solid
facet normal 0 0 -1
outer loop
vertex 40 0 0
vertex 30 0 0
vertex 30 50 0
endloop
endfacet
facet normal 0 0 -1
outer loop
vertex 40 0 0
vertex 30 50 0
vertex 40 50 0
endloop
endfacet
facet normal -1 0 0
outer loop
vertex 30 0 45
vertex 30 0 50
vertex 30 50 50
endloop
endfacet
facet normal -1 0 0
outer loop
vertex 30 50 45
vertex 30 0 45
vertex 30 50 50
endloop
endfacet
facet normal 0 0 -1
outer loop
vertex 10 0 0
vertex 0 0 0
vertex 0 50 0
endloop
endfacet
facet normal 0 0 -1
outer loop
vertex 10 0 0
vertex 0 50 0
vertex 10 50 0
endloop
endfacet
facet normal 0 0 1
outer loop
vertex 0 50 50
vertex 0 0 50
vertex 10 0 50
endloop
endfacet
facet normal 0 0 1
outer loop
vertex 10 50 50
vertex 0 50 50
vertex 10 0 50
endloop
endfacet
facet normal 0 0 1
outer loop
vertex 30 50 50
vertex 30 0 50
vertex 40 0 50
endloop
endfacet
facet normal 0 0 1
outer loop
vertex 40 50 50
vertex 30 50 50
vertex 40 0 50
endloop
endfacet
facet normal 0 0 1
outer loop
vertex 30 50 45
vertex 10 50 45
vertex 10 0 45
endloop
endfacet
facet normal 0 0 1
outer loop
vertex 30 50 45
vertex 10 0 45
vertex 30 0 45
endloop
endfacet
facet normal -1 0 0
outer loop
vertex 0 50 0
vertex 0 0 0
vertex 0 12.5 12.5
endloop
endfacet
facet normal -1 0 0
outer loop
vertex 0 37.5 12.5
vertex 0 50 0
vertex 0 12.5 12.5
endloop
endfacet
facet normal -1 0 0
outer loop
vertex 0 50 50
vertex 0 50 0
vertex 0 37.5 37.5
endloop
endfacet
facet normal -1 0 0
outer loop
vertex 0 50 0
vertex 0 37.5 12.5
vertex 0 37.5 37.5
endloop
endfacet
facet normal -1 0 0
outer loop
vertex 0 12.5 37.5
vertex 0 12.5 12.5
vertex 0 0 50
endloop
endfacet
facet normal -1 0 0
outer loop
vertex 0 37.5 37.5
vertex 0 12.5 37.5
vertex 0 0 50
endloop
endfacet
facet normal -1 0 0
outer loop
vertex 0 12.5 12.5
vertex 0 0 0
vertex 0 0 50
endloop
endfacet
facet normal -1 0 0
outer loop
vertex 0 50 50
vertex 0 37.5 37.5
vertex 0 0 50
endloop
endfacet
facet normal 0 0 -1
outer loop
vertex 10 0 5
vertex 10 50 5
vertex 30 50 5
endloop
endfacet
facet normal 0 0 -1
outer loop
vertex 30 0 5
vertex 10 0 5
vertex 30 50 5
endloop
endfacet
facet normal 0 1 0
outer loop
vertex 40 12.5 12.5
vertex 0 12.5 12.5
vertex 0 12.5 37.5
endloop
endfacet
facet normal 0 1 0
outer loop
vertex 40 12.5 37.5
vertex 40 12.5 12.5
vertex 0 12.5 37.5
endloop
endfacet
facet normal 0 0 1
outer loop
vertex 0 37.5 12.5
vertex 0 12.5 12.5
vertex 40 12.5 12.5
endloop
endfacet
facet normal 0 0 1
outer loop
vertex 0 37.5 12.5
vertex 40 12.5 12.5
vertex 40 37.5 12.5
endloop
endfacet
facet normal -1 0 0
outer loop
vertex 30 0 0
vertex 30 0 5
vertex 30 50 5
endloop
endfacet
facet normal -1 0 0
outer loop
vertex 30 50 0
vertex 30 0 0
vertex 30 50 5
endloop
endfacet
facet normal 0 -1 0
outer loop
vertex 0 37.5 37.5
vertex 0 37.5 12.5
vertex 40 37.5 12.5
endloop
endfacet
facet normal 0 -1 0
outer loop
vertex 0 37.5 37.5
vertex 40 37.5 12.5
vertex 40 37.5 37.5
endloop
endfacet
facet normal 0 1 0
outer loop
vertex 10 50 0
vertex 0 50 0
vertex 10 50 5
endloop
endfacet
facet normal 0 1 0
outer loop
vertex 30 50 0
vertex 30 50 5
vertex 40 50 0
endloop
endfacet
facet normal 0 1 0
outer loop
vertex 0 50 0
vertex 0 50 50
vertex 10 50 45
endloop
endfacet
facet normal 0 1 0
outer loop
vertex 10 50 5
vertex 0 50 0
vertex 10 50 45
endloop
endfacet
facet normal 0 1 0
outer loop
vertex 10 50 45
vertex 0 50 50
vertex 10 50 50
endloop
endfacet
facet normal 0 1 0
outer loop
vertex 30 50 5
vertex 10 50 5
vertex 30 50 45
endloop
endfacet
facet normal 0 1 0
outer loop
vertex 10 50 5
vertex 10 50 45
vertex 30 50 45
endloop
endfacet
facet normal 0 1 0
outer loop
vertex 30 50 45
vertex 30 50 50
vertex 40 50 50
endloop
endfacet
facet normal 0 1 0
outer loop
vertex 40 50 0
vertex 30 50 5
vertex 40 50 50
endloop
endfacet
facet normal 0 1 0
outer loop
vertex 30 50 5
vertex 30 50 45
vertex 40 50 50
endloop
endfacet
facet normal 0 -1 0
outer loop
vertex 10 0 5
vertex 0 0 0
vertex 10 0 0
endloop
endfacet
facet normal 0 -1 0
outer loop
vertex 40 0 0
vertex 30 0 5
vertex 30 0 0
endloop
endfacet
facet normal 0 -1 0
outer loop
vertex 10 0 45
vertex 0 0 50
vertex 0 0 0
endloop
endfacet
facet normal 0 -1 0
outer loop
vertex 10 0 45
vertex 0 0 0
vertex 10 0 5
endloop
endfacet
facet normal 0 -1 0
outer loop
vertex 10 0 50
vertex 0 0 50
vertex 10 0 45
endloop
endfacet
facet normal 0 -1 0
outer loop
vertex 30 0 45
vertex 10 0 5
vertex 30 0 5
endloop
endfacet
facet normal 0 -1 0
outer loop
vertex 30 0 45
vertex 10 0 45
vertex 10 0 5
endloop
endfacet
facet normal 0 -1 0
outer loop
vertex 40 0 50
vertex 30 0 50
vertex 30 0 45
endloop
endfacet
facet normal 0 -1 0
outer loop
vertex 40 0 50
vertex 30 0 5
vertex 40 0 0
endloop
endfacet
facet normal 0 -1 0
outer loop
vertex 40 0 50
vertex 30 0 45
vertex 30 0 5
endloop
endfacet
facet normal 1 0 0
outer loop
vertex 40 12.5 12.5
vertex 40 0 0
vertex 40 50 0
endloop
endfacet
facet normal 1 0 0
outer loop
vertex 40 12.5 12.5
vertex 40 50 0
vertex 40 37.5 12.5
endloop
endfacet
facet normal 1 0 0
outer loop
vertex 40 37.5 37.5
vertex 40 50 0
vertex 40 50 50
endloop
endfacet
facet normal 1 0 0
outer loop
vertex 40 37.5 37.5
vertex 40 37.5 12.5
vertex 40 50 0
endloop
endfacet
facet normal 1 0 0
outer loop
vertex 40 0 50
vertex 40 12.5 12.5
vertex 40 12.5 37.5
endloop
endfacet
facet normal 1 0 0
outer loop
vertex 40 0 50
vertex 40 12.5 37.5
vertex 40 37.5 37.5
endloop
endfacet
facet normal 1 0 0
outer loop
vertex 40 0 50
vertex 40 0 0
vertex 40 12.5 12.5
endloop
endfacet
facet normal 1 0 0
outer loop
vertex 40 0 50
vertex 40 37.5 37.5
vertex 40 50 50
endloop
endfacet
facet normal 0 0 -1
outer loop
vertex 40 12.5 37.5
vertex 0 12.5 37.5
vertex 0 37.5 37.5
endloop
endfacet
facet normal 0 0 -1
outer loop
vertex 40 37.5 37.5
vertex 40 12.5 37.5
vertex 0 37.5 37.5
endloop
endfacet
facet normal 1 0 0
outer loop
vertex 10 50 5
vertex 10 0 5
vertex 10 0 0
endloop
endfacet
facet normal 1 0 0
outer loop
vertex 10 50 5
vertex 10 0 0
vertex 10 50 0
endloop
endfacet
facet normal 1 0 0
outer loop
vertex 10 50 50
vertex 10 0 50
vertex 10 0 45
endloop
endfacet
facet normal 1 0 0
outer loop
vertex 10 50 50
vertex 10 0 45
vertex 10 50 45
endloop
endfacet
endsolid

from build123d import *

# Parameters (mm, degrees)
F0_W          = 40
F0_H          = 50
F1_DEPTH      = 50
F2_W          = 25
F2_H          = 25
F3_DEPTH      = 139.9
F3_DEPTH_BACK = 82.6
F5_W          = 20
F5_H          = 50
F6_DEPTH      = 5
F7_START      = -45
F7_DEPTH      = 30.1


with BuildPart() as f1:
    # F0 (on Front) → F1 (new body)
    with BuildSketch(Plane.XZ):
        with Locations((20, 25)):
            Rectangle(F0_W, F0_H)
    extrude(amount=-F1_DEPTH)


with BuildPart() as f3:
    # F2 (on face) → F3 (new body, two sides)
    with BuildSketch(Plane.YZ.offset(40)) as f3_sk:
        with Locations((25, 25)):
            Rectangle(F2_W, F2_H)
    extrude(amount=-F3_DEPTH)
    extrude(f3_sk.sketch, amount=F3_DEPTH_BACK)


with BuildPart() as f1_1:
    add(f1.part)

    # F4: cut F3
    add(f3.part, mode=Mode.SUBTRACT)

    # F5 (on face) → F6 (cut)
    with BuildSketch(Plane.XY.offset(50)):
        with Locations((20, 25)):
            Rectangle(F5_W, F5_H)
    extrude(amount=-F6_DEPTH, mode=Mode.SUBTRACT)

    # F5 (on face) → F7 (cut)
    with BuildSketch(Plane.XY.offset(50).offset(F7_START)):
        with Locations((20, 25)):
            Rectangle(F5_W, F5_H)
    extrude(amount=-F7_DEPTH, mode=Mode.SUBTRACT)


solid = f1_1.part
